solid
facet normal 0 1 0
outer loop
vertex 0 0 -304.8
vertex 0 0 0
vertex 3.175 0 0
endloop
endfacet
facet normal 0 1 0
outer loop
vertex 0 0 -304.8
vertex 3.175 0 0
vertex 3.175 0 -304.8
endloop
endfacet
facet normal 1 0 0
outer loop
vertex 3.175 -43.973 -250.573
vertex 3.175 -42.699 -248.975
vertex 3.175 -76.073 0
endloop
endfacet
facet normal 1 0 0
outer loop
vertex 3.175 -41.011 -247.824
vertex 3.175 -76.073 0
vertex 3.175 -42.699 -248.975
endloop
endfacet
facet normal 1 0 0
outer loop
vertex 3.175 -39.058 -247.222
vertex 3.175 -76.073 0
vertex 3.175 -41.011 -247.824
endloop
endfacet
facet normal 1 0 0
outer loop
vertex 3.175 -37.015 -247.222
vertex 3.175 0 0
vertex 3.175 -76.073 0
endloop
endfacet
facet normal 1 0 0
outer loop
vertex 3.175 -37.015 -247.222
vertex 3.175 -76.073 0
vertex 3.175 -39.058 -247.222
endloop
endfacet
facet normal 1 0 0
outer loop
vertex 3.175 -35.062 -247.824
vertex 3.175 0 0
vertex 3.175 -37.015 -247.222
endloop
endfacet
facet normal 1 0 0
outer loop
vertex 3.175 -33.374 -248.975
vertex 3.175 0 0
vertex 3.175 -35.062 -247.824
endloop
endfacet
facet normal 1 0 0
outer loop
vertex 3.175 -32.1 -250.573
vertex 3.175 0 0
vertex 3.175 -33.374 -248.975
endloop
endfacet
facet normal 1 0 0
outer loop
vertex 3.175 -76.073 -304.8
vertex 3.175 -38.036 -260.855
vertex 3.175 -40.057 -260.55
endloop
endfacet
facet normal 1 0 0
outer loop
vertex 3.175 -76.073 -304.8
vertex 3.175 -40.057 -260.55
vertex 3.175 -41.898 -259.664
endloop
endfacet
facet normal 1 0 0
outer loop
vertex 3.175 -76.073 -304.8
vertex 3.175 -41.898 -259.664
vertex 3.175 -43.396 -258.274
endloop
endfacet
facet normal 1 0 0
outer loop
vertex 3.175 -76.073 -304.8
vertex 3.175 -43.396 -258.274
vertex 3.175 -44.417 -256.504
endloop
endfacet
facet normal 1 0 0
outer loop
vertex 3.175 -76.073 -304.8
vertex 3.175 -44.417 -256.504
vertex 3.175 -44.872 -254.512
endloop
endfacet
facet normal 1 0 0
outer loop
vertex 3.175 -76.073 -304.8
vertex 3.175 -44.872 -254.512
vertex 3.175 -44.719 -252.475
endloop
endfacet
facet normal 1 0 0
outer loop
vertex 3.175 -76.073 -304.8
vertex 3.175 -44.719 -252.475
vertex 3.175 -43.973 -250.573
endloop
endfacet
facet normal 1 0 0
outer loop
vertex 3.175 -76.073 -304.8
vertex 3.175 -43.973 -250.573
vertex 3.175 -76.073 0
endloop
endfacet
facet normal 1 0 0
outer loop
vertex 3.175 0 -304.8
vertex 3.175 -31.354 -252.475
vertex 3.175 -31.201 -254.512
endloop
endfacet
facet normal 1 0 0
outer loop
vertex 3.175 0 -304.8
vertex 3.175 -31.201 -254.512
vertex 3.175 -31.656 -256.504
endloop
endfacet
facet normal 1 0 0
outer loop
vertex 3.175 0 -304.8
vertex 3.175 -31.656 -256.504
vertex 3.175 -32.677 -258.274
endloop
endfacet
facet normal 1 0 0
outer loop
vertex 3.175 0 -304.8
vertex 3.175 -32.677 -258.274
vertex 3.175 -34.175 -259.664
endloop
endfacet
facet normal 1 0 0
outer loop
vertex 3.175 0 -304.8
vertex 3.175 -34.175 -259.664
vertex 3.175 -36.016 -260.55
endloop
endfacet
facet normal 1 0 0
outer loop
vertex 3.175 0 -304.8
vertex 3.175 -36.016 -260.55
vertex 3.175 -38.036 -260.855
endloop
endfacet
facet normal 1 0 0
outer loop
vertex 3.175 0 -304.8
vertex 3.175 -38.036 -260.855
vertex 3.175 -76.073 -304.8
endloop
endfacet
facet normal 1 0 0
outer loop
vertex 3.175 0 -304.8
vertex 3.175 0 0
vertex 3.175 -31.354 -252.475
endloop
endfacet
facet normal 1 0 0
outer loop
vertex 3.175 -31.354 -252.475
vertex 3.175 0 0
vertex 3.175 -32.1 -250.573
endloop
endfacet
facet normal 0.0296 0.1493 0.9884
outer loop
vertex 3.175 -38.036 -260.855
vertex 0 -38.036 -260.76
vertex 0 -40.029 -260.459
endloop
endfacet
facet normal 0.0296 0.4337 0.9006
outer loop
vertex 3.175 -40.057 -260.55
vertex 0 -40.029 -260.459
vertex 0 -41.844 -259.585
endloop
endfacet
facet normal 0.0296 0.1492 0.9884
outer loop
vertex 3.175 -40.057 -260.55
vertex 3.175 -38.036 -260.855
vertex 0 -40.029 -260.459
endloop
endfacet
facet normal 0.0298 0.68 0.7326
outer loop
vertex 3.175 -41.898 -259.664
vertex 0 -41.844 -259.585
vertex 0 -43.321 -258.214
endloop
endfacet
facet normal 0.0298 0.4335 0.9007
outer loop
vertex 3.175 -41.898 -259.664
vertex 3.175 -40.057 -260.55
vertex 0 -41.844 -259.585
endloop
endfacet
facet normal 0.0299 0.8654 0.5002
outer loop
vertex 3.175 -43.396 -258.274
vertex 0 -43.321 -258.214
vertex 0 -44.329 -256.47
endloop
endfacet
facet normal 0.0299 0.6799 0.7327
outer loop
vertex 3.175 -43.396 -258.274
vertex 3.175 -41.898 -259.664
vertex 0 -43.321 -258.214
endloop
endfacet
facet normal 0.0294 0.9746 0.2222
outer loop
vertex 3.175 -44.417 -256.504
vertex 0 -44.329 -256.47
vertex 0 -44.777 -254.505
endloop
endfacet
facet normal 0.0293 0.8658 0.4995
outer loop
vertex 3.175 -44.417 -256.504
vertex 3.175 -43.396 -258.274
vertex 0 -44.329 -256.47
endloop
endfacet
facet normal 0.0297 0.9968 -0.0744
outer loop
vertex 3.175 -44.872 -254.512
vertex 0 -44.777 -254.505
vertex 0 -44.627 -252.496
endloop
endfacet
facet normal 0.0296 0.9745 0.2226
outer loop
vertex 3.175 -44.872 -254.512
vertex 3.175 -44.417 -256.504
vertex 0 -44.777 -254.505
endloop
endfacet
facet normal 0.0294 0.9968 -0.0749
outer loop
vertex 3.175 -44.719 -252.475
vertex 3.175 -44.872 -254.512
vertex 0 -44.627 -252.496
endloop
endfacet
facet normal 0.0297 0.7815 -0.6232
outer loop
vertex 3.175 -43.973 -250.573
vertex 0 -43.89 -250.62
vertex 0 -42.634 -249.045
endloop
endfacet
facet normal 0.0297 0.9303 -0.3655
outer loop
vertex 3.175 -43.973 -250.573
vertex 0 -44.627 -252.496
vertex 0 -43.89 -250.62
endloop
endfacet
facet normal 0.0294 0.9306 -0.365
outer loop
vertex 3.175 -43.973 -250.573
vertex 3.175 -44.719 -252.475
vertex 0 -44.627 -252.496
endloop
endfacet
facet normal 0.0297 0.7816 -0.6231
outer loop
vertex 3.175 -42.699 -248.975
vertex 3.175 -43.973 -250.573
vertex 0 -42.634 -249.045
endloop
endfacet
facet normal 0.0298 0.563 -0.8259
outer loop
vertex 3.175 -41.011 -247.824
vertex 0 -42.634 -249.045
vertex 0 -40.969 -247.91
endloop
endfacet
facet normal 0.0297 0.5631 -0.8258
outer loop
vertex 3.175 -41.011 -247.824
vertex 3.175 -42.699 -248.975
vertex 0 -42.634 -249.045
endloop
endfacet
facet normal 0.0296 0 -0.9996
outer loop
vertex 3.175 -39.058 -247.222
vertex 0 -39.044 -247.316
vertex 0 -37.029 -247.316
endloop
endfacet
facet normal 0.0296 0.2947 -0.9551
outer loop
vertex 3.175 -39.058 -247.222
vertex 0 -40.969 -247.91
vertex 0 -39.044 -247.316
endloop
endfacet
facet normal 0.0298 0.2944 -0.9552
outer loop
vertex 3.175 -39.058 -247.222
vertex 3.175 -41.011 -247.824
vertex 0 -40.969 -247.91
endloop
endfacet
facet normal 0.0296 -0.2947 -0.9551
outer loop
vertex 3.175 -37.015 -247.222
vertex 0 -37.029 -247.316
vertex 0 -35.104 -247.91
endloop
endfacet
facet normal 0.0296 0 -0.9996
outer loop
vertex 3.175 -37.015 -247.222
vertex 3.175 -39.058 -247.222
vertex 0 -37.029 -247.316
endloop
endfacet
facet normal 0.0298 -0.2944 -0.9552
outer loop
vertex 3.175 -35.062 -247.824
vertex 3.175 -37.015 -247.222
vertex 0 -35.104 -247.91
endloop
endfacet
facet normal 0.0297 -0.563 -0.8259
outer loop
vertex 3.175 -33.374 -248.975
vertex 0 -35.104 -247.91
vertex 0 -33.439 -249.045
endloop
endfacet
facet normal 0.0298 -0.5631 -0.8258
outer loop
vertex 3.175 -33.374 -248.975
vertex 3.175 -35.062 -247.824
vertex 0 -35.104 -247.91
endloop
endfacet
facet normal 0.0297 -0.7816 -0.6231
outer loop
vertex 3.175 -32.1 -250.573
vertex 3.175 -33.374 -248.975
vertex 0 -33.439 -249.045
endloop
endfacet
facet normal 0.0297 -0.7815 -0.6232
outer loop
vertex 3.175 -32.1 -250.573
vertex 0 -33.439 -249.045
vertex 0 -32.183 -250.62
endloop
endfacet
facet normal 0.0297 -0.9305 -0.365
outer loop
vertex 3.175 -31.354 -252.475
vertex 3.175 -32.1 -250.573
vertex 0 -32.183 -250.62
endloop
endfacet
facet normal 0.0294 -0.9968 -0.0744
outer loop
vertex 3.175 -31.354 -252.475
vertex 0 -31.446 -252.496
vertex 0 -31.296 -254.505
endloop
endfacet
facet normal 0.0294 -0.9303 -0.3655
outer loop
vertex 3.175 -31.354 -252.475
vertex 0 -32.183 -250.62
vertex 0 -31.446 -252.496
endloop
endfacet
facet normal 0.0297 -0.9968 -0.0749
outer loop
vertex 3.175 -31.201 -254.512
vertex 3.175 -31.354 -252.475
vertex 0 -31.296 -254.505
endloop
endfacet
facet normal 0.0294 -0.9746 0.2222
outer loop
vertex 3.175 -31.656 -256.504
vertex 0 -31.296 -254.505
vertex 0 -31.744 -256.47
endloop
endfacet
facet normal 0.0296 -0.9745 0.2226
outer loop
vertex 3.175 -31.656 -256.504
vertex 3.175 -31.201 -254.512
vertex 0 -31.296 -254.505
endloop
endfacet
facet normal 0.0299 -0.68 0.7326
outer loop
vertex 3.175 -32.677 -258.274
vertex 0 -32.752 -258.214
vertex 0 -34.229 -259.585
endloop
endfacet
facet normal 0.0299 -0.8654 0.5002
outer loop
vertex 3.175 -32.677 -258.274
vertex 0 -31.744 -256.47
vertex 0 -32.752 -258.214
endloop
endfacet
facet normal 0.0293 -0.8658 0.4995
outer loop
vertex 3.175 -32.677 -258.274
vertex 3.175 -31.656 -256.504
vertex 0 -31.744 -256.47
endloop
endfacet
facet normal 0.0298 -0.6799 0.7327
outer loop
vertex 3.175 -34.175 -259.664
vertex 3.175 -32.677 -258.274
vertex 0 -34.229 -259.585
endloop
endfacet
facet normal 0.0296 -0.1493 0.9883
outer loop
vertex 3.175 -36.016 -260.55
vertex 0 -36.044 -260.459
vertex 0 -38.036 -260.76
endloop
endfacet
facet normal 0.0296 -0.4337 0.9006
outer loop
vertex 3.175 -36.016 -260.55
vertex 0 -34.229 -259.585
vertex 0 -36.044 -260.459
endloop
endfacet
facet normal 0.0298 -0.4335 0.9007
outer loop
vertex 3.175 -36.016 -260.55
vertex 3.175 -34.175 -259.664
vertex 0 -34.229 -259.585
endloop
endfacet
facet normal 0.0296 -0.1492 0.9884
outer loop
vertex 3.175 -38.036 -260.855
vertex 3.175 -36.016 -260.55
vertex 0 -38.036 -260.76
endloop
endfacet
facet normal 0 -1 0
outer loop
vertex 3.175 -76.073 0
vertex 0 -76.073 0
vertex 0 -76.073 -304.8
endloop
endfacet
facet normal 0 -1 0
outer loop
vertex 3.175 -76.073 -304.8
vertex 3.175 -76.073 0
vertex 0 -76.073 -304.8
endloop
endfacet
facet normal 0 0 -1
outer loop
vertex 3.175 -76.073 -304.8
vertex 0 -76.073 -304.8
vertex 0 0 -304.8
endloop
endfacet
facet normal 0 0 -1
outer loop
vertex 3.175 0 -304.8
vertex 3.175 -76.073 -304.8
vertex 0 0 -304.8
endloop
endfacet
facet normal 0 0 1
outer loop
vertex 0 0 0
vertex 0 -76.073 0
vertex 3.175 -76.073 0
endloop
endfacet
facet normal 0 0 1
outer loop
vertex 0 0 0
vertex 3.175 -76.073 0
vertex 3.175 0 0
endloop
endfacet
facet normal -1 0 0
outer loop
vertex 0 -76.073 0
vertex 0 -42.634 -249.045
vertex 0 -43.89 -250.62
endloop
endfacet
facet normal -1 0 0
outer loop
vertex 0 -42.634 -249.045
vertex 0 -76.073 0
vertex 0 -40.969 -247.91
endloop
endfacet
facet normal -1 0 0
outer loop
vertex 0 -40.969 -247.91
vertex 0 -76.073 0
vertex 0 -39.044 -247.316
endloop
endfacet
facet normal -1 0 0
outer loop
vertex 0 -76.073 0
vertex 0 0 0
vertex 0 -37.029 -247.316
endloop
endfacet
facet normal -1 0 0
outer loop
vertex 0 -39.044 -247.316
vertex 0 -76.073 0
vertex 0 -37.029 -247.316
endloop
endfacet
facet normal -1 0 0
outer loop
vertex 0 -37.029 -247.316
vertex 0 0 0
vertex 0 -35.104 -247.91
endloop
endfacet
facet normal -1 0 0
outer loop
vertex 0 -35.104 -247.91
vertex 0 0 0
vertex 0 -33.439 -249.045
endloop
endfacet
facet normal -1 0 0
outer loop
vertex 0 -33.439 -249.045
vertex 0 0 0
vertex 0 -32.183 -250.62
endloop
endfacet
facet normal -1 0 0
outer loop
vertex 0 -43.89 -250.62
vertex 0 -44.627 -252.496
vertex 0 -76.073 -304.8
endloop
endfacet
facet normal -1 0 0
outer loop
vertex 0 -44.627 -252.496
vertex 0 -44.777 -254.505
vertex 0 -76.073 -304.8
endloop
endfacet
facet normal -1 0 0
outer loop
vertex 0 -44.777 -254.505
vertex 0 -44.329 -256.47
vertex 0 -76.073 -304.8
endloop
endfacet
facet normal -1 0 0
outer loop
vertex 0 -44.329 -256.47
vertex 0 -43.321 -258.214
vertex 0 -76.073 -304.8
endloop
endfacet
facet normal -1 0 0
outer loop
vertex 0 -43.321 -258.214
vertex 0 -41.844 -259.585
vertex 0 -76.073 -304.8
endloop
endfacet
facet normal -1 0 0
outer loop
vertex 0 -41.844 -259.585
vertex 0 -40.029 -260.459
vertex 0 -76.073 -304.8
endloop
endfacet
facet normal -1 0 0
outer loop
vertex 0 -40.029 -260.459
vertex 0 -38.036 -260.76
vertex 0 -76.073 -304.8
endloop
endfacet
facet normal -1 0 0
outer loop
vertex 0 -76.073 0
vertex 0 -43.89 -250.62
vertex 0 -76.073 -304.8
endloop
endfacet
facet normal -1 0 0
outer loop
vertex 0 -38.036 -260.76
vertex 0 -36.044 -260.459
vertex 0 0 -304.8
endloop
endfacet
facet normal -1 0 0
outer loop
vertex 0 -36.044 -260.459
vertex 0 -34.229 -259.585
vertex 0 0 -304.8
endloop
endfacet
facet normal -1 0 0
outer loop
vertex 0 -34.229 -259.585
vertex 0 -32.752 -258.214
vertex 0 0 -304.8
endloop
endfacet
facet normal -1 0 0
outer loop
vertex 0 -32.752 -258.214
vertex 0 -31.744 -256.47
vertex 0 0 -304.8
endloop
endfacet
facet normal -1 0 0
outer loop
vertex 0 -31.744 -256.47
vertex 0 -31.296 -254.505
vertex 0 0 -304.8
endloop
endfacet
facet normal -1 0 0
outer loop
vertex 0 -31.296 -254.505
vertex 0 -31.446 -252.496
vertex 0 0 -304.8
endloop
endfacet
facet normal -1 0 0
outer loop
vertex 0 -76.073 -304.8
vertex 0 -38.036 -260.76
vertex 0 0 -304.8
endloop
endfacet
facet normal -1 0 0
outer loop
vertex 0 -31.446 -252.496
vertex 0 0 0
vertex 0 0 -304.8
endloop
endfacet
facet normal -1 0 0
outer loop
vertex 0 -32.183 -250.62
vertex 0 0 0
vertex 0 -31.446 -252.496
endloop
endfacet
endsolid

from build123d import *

# Parameters (mm, degrees)
SKETCH1_W           = 304.8
SKETCH1_H           = 76.073
BOSS_EXTRUDE1_DEPTH = 3.175


with BuildPart() as part:
    # Sketch1 → Boss-Extrude1 (new body)
    with BuildSketch(Plane(origin=(0, 0, 0), x_dir=(0, 0, -1), z_dir=(1, 0, 0))):
        with Locations((152.4, -38.0365)):
            Rectangle(SKETCH1_W, SKETCH1_H)
    extrude(amount=BOSS_EXTRUDE1_DEPTH)

    # Sketch7 → 1/4 NPT Tapped Hole2 (revolve, cut)
    with BuildSketch(Plane(origin=(3.175, -38.0365, -254), x_dir=(0, 0, -1), z_dir=(0, 1, 0))):
        Polygon((0, 0), (0, 3.175), (5.5626, 3.175), (5.5626, 9.906), (6.557984794, 9.906), (6.8545837, 0), align=None)
    revolve(axis=Axis((9.525, -38.0365, -254), (-1, 0, 0)), mode=Mode.SUBTRACT)


solid = part.part
